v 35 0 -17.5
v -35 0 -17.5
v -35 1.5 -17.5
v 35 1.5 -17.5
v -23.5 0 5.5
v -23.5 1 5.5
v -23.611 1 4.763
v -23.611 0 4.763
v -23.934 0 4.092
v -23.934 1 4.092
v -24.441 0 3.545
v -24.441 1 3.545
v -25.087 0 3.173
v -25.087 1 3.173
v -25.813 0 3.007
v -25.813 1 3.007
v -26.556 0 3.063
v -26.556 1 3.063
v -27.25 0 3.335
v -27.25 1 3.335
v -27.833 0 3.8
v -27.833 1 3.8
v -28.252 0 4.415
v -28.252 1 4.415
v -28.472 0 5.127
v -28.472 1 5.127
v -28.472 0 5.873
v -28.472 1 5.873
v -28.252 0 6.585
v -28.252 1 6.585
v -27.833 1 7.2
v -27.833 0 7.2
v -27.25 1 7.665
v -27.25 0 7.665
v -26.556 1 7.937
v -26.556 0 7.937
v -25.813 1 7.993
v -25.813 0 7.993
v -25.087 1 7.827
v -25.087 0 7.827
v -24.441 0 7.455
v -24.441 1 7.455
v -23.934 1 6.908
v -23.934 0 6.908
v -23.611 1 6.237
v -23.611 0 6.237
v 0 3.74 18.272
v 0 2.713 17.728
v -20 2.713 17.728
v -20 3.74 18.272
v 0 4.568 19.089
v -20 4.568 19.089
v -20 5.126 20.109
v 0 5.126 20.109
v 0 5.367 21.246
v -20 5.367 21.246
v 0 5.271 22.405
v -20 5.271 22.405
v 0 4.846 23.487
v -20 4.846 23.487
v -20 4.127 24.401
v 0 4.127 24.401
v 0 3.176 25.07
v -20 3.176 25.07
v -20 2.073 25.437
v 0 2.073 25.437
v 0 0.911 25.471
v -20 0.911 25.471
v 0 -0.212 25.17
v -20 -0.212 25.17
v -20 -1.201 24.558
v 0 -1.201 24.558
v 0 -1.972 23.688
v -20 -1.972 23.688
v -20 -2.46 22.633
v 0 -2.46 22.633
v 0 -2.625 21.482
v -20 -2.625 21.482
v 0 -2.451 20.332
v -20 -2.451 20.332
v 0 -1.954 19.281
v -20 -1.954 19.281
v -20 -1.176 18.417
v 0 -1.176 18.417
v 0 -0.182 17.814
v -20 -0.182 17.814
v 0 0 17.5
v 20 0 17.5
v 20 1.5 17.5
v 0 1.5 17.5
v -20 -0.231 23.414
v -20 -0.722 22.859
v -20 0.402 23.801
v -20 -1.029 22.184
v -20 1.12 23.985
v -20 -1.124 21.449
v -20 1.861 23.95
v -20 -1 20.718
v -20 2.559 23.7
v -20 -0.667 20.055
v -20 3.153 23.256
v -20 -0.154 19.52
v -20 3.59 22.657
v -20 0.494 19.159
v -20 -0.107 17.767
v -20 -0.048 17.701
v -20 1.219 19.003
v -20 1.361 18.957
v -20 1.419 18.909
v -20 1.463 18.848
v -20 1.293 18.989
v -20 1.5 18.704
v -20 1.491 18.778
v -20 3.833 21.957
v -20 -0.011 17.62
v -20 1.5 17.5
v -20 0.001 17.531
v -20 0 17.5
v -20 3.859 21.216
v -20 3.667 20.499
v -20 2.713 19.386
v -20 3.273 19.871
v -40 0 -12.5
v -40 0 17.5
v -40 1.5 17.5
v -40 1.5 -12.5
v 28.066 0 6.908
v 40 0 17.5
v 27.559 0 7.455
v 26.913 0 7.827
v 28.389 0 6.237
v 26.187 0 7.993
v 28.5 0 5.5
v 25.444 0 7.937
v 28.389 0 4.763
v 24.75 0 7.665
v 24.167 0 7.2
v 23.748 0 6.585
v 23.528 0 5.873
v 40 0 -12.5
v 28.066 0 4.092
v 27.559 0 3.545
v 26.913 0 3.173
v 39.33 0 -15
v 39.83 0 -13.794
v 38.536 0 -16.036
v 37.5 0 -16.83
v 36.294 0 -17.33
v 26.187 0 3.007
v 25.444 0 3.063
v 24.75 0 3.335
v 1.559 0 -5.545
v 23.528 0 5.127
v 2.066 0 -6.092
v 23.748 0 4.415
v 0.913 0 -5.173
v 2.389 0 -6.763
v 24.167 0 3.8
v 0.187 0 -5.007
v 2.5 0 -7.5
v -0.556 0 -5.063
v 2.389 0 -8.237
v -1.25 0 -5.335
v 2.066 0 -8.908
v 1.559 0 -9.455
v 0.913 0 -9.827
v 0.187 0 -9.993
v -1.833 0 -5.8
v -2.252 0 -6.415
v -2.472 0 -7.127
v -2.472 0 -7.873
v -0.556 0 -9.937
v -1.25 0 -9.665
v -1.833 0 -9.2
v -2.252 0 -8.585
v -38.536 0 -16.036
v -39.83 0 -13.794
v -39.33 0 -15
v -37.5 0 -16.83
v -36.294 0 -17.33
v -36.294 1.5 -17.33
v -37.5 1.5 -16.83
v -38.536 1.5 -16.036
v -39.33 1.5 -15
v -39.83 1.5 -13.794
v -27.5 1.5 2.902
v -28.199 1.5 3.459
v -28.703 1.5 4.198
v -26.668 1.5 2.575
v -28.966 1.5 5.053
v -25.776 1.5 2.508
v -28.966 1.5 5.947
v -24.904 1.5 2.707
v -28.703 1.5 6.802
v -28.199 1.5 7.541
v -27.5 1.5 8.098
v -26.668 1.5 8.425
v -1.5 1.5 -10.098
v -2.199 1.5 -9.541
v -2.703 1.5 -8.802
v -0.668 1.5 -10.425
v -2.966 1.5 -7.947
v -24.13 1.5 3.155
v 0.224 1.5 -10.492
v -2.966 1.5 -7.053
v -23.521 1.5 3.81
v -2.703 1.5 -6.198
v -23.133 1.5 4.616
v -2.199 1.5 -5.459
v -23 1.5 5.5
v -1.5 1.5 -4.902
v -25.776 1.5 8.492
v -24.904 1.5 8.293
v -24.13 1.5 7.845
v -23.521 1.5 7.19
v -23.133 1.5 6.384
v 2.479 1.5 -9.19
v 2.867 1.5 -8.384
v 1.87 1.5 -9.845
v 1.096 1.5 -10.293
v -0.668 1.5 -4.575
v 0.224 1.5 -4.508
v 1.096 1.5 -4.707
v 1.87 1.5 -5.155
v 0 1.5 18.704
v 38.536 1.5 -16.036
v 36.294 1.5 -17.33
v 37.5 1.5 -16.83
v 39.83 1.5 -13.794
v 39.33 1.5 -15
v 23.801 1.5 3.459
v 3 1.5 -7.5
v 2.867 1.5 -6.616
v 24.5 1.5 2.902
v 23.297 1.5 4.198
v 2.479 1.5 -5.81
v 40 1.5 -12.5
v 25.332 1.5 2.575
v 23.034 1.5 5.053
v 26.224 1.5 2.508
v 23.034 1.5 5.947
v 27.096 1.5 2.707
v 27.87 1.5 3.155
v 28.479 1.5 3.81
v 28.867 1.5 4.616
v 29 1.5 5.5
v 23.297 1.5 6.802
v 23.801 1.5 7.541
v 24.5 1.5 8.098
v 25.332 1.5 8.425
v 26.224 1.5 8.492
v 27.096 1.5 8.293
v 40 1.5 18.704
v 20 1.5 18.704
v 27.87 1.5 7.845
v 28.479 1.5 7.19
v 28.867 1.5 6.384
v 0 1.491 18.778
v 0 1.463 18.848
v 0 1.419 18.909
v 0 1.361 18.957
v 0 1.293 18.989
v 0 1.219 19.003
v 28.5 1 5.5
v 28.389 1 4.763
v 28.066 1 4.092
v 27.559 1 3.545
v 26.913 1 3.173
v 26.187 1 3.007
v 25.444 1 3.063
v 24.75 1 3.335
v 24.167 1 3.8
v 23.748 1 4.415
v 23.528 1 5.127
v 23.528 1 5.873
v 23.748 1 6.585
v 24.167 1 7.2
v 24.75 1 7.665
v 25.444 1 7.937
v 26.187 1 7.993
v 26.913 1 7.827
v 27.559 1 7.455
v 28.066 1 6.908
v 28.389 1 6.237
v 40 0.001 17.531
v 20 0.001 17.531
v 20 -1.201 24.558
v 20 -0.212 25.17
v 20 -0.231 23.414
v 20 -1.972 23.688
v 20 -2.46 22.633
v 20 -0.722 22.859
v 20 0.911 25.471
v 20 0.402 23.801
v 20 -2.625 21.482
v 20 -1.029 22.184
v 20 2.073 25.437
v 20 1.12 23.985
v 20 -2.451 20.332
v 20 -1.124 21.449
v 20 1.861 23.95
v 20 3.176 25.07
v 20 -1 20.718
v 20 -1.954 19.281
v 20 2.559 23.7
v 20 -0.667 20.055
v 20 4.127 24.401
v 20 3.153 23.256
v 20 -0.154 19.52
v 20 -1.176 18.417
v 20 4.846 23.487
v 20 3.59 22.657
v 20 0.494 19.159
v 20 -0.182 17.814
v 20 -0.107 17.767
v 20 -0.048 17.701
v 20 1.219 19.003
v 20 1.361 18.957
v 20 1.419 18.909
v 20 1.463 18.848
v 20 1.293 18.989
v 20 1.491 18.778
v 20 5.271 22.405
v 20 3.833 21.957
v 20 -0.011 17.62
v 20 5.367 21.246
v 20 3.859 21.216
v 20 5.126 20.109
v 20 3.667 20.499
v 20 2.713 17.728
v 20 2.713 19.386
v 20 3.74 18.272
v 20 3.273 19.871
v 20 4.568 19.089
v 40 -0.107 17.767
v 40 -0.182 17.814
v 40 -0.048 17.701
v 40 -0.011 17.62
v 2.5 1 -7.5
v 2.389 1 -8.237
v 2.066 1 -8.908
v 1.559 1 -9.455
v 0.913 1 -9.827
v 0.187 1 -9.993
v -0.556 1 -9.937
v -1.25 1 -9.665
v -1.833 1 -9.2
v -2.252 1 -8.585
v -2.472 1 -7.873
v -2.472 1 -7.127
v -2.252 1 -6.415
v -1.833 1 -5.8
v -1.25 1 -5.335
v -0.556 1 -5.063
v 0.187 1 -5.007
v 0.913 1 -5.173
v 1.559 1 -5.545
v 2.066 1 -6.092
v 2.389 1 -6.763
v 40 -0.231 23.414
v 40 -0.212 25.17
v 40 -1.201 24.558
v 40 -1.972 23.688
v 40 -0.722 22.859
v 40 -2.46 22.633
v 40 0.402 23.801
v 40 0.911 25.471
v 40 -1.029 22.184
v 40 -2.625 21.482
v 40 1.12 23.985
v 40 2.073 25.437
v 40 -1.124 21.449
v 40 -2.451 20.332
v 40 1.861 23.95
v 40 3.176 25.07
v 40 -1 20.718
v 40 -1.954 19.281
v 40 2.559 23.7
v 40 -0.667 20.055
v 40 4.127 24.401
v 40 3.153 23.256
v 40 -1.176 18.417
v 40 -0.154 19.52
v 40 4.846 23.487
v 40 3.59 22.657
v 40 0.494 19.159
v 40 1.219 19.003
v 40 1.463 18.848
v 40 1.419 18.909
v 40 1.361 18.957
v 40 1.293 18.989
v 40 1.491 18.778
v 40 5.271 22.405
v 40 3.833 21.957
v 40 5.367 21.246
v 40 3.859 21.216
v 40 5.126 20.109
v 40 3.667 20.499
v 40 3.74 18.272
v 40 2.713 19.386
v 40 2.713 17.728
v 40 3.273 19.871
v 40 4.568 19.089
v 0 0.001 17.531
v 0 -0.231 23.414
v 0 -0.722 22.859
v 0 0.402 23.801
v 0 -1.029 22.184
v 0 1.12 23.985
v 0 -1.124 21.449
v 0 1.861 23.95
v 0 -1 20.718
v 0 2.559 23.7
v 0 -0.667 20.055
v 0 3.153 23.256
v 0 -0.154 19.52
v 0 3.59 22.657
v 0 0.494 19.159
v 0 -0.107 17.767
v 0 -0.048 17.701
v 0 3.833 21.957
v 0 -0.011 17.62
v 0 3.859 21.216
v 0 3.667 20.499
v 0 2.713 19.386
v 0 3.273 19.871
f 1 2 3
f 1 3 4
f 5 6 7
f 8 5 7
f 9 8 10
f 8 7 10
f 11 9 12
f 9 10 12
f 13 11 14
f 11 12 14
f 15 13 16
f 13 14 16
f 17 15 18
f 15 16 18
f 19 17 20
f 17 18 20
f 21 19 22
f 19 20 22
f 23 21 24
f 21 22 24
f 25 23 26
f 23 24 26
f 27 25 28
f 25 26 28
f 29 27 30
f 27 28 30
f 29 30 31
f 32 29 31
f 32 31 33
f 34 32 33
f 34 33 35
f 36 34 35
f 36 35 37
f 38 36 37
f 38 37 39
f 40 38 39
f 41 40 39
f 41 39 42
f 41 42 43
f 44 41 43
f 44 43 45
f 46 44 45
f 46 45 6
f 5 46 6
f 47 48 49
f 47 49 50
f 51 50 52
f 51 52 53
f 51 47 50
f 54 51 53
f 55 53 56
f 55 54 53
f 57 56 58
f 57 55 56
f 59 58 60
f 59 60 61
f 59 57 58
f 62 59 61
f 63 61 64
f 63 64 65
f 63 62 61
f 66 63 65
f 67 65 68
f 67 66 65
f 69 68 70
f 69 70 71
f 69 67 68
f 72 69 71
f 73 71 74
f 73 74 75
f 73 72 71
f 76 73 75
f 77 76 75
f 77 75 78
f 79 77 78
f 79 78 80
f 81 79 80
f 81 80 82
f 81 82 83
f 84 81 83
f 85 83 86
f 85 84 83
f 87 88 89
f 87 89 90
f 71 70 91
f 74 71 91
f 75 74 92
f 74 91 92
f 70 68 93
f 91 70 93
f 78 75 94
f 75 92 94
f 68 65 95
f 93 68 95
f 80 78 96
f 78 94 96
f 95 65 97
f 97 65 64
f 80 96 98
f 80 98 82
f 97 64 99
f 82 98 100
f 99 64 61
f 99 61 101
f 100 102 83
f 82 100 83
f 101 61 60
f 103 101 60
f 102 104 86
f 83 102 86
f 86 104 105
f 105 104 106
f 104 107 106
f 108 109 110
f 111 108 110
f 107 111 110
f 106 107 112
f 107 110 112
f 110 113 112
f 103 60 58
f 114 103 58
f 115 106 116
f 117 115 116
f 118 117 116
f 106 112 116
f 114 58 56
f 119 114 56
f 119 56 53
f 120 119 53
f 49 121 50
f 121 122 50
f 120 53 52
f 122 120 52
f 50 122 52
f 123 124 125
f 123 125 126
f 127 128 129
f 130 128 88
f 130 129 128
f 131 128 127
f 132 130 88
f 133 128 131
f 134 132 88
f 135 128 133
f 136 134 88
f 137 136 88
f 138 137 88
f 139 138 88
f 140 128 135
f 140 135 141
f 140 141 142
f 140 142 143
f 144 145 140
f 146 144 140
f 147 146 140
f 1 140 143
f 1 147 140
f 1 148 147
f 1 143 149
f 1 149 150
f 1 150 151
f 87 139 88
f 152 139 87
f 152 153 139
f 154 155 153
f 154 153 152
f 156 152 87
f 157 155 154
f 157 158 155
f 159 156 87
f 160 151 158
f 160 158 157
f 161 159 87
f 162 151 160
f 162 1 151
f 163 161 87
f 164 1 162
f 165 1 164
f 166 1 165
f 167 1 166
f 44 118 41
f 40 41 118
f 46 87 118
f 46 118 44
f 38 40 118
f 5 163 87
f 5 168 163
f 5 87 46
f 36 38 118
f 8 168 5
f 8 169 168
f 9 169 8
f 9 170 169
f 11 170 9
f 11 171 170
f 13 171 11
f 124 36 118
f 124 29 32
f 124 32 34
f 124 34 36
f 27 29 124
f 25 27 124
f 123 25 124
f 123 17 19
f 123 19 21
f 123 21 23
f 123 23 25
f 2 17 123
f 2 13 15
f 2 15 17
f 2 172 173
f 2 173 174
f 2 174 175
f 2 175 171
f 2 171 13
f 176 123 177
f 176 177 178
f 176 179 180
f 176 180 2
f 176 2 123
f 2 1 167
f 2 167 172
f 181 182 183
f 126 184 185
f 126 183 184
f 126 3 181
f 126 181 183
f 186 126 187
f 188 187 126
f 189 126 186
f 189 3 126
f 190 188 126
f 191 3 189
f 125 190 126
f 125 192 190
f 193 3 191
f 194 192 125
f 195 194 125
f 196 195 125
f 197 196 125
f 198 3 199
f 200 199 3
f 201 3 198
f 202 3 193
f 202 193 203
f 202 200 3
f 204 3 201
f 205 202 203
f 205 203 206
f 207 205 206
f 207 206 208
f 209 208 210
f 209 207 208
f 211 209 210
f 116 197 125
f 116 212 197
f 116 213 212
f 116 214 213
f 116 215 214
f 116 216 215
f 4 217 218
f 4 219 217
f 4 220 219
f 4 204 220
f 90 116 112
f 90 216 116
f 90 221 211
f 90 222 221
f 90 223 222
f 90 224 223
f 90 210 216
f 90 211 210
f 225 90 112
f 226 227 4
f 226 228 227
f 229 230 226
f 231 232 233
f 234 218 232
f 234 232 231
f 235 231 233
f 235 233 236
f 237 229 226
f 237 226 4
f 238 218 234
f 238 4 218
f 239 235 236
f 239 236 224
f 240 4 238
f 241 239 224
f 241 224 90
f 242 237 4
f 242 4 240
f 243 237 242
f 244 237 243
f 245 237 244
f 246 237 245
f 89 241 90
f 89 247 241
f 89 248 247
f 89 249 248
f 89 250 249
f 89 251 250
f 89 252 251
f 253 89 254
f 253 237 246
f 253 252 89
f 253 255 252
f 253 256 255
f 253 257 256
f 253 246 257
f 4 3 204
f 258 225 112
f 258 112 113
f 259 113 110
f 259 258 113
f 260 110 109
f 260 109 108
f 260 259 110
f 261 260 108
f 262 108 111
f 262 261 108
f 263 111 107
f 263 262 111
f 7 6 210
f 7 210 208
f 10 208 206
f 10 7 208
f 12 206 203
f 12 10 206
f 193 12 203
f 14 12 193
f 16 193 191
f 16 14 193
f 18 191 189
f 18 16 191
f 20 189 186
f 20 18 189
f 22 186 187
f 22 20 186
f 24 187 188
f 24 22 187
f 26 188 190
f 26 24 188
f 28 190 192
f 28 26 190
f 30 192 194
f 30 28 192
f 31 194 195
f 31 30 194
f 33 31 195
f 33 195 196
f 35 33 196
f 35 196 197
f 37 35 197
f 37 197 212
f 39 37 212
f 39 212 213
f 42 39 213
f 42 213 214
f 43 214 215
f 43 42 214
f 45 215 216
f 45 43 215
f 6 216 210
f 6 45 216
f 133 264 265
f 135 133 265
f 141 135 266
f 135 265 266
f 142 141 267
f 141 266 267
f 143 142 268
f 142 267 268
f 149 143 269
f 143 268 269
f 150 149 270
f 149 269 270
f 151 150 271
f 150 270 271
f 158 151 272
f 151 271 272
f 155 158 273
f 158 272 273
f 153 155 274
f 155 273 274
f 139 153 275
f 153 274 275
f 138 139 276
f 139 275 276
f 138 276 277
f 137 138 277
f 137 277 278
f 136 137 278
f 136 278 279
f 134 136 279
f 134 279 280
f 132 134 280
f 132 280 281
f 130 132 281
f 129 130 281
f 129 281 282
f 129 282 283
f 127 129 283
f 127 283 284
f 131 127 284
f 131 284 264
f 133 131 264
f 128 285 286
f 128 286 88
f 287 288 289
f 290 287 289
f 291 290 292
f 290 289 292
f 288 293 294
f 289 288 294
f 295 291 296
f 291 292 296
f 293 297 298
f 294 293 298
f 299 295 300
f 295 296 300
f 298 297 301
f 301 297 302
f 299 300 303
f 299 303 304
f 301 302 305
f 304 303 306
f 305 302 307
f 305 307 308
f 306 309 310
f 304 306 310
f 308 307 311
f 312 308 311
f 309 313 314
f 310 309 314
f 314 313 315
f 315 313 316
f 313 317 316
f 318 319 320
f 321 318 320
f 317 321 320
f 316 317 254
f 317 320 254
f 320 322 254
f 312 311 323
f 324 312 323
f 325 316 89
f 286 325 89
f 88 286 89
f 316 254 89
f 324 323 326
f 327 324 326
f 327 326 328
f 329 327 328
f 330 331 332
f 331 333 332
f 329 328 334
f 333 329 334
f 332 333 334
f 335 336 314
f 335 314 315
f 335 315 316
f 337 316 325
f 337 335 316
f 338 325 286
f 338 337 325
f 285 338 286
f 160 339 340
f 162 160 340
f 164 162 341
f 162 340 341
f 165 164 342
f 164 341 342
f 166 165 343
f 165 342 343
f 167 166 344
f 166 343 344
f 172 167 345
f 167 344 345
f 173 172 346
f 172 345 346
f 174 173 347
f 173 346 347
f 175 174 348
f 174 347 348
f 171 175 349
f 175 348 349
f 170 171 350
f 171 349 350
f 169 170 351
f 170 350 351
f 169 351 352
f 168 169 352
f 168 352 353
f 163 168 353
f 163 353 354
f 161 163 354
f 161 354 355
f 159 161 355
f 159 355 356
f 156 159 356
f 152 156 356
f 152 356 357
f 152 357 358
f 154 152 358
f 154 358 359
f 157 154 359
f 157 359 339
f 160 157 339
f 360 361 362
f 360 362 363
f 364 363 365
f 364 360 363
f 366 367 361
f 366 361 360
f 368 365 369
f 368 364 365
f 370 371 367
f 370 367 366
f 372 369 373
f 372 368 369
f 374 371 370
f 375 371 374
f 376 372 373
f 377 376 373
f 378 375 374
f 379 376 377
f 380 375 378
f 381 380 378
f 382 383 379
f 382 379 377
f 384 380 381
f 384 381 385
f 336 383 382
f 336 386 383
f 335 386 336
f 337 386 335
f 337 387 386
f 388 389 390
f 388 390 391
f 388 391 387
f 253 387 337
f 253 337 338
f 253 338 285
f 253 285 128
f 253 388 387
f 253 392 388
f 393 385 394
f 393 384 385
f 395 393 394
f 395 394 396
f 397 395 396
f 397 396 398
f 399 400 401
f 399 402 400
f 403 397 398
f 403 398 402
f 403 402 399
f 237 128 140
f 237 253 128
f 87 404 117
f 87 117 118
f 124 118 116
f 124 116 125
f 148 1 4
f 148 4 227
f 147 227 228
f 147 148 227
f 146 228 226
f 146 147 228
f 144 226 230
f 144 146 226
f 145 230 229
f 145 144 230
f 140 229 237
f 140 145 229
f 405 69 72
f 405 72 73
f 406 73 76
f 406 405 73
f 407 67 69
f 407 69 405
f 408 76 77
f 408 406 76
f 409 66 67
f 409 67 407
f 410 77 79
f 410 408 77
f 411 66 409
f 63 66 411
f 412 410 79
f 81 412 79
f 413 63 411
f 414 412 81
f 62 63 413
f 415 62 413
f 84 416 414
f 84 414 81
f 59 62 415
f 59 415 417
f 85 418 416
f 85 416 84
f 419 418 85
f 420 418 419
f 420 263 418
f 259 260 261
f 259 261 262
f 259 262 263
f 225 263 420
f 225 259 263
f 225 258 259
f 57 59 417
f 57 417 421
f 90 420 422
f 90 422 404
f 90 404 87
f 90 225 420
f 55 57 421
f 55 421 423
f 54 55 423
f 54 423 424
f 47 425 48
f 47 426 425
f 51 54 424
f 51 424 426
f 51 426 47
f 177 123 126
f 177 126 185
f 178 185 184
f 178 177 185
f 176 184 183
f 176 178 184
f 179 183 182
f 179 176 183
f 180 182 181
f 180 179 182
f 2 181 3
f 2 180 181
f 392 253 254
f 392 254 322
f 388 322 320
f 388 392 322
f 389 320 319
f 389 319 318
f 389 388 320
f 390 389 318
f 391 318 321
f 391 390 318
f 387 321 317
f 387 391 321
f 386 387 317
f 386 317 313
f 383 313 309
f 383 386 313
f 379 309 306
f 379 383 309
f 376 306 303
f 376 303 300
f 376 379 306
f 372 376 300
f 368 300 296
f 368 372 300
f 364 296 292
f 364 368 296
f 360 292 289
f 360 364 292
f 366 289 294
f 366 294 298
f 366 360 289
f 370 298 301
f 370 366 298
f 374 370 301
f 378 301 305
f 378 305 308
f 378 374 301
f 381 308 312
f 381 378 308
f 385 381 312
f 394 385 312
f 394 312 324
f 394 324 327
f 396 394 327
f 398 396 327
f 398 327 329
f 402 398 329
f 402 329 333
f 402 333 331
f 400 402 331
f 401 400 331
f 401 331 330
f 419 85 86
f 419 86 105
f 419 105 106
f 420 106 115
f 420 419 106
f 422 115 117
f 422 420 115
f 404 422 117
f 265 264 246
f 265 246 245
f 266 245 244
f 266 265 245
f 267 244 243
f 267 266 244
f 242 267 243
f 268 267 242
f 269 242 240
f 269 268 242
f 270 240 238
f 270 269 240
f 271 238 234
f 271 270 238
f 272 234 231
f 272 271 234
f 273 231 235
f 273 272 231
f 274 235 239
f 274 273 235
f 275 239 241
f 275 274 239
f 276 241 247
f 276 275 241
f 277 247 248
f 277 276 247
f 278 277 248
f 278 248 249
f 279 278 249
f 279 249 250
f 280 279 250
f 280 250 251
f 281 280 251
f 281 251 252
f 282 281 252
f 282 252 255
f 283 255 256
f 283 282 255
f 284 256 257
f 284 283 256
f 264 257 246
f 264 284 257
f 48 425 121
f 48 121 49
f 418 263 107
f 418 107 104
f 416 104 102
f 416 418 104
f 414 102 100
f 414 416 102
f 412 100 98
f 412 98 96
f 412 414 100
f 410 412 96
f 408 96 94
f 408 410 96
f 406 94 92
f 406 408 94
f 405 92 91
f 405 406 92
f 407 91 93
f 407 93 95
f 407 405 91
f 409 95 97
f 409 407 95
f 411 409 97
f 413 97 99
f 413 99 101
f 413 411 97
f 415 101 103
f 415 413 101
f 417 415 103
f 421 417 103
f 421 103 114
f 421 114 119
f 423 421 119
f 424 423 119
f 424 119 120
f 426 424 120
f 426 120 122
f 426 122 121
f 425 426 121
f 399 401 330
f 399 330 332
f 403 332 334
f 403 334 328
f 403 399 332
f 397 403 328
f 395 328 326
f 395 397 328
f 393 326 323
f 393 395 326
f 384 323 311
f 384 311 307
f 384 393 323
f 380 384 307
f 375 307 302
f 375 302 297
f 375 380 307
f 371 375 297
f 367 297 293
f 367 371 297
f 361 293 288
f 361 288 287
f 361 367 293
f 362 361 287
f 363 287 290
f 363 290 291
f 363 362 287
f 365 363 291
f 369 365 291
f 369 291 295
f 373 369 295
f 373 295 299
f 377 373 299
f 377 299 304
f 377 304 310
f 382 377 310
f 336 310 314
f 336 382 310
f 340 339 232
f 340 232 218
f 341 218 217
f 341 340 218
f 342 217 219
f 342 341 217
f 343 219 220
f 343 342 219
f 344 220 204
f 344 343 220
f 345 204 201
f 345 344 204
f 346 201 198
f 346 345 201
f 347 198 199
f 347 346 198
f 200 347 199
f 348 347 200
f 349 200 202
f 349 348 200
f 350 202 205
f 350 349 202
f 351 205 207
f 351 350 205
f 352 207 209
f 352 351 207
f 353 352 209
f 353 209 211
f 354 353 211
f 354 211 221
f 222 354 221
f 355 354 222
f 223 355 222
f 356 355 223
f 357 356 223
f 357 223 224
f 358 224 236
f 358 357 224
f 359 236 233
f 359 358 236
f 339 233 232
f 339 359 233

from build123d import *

# Parameters (mm, degrees)
BOSS_EXTRUDE1_DEPTH = 1.5
BOSS_EXTRUDE2_DEPTH = 20
LPATTERN1_COUNT     = 2
LPATTERN1_PITCH     = 40
SKETCH4_R           = 2.5
CUT_EXTRUDE1_DEPTH  = 5.124819455
CHAMFER1_SIZE       = 0.5


with BuildPart() as part:
    # Sketch1 → Boss-Extrude1 (new body)
    with BuildSketch(Plane(origin=(0, 0, 0), x_dir=(1, 0, 0), z_dir=(0, 1, 0))):
        with BuildLine():
            Line((40, -17.5), (-40, -17.5))
            Line((-40, -17.5), (-40, 12.5))
            ThreePointArc((-40, 12.5), (-38.535533906, 16.035533906), (-35, 17.5))
            Line((-35, 17.5), (35, 17.5))
            ThreePointArc((35, 17.5), (38.535533906, 16.035533906), (40, 12.5))
            Line((40, 12.5), (40, -17.5))
        make_face()
    extrude(amount=BOSS_EXTRUDE1_DEPTH)

    # Sketch3 → Boss-Extrude2 (add)
    with BuildSketch(Plane(origin=(40, 0, 0), x_dir=(0, 0, -1), z_dir=(1, 0, 0))):
        with BuildLine():
            Line((-19.385927186, 2.712688903), (-17.728294567, 2.712688903))
            ThreePointArc((-17.728294567, 2.712688903), (-25.49630848, 1.493271308), (-17.813805195, -0.182486041))
            ThreePointArc((-17.813805195, -0.182486041), (-17.700741006, -0.047620698), (-17.531495251, 0.000629131))
            Line((-17.531495251, 0.000629131), (-17.5, 0))
            Line((-17.5, 0), (-17.5, 1.5))
            Line((-17.5, 1.5), (-18.703537452, 1.5))
            ThreePointArc((-18.703537452, 1.5), (-18.908926347, 1.418667331), (-19.002949729, 1.218769344))
            ThreePointArc((-19.002949729, 1.218769344), (-23.919742449, 0.754362088), (-19.385927186, 2.712688903))
        make_face()
    boss_extrude2 = extrude(amount=-BOSS_EXTRUDE2_DEPTH)

    # LPattern1: Boss-Extrude2 ×2
    with Locations(*[(-i * LPATTERN1_PITCH, 0, 0) for i in range(1, LPATTERN1_COUNT)]):
        add(boss_extrude2)

    # Sketch4 → Cut-Extrude1 (cut, through all)
    with BuildSketch(Plane(origin=(0, 1.5, 0), x_dir=(1, 0, 0), z_dir=(0, 1, 0))):
        with Locations((0, 7.5)):
            Circle(SKETCH4_R)
        with Locations((-26, -5.5)):
            Circle(SKETCH4_R)
        with Locations((26, -5.5)):
            Circle(SKETCH4_R)
    extrude(amount=-CUT_EXTRUDE1_DEPTH, mode=Mode.SUBTRACT)

    # Chamfer1
    chamfer1_edges = [part.edges().sort_by_distance(p)[0] for p in [
        (-2.5, 1.5, -7.5),
        (-28.5, 1.5, 5.5),
        (23.5, 1.5, 5.5),
    ]]
    chamfer(chamfer1_edges, length=CHAMFER1_SIZE)


solid = part.part
